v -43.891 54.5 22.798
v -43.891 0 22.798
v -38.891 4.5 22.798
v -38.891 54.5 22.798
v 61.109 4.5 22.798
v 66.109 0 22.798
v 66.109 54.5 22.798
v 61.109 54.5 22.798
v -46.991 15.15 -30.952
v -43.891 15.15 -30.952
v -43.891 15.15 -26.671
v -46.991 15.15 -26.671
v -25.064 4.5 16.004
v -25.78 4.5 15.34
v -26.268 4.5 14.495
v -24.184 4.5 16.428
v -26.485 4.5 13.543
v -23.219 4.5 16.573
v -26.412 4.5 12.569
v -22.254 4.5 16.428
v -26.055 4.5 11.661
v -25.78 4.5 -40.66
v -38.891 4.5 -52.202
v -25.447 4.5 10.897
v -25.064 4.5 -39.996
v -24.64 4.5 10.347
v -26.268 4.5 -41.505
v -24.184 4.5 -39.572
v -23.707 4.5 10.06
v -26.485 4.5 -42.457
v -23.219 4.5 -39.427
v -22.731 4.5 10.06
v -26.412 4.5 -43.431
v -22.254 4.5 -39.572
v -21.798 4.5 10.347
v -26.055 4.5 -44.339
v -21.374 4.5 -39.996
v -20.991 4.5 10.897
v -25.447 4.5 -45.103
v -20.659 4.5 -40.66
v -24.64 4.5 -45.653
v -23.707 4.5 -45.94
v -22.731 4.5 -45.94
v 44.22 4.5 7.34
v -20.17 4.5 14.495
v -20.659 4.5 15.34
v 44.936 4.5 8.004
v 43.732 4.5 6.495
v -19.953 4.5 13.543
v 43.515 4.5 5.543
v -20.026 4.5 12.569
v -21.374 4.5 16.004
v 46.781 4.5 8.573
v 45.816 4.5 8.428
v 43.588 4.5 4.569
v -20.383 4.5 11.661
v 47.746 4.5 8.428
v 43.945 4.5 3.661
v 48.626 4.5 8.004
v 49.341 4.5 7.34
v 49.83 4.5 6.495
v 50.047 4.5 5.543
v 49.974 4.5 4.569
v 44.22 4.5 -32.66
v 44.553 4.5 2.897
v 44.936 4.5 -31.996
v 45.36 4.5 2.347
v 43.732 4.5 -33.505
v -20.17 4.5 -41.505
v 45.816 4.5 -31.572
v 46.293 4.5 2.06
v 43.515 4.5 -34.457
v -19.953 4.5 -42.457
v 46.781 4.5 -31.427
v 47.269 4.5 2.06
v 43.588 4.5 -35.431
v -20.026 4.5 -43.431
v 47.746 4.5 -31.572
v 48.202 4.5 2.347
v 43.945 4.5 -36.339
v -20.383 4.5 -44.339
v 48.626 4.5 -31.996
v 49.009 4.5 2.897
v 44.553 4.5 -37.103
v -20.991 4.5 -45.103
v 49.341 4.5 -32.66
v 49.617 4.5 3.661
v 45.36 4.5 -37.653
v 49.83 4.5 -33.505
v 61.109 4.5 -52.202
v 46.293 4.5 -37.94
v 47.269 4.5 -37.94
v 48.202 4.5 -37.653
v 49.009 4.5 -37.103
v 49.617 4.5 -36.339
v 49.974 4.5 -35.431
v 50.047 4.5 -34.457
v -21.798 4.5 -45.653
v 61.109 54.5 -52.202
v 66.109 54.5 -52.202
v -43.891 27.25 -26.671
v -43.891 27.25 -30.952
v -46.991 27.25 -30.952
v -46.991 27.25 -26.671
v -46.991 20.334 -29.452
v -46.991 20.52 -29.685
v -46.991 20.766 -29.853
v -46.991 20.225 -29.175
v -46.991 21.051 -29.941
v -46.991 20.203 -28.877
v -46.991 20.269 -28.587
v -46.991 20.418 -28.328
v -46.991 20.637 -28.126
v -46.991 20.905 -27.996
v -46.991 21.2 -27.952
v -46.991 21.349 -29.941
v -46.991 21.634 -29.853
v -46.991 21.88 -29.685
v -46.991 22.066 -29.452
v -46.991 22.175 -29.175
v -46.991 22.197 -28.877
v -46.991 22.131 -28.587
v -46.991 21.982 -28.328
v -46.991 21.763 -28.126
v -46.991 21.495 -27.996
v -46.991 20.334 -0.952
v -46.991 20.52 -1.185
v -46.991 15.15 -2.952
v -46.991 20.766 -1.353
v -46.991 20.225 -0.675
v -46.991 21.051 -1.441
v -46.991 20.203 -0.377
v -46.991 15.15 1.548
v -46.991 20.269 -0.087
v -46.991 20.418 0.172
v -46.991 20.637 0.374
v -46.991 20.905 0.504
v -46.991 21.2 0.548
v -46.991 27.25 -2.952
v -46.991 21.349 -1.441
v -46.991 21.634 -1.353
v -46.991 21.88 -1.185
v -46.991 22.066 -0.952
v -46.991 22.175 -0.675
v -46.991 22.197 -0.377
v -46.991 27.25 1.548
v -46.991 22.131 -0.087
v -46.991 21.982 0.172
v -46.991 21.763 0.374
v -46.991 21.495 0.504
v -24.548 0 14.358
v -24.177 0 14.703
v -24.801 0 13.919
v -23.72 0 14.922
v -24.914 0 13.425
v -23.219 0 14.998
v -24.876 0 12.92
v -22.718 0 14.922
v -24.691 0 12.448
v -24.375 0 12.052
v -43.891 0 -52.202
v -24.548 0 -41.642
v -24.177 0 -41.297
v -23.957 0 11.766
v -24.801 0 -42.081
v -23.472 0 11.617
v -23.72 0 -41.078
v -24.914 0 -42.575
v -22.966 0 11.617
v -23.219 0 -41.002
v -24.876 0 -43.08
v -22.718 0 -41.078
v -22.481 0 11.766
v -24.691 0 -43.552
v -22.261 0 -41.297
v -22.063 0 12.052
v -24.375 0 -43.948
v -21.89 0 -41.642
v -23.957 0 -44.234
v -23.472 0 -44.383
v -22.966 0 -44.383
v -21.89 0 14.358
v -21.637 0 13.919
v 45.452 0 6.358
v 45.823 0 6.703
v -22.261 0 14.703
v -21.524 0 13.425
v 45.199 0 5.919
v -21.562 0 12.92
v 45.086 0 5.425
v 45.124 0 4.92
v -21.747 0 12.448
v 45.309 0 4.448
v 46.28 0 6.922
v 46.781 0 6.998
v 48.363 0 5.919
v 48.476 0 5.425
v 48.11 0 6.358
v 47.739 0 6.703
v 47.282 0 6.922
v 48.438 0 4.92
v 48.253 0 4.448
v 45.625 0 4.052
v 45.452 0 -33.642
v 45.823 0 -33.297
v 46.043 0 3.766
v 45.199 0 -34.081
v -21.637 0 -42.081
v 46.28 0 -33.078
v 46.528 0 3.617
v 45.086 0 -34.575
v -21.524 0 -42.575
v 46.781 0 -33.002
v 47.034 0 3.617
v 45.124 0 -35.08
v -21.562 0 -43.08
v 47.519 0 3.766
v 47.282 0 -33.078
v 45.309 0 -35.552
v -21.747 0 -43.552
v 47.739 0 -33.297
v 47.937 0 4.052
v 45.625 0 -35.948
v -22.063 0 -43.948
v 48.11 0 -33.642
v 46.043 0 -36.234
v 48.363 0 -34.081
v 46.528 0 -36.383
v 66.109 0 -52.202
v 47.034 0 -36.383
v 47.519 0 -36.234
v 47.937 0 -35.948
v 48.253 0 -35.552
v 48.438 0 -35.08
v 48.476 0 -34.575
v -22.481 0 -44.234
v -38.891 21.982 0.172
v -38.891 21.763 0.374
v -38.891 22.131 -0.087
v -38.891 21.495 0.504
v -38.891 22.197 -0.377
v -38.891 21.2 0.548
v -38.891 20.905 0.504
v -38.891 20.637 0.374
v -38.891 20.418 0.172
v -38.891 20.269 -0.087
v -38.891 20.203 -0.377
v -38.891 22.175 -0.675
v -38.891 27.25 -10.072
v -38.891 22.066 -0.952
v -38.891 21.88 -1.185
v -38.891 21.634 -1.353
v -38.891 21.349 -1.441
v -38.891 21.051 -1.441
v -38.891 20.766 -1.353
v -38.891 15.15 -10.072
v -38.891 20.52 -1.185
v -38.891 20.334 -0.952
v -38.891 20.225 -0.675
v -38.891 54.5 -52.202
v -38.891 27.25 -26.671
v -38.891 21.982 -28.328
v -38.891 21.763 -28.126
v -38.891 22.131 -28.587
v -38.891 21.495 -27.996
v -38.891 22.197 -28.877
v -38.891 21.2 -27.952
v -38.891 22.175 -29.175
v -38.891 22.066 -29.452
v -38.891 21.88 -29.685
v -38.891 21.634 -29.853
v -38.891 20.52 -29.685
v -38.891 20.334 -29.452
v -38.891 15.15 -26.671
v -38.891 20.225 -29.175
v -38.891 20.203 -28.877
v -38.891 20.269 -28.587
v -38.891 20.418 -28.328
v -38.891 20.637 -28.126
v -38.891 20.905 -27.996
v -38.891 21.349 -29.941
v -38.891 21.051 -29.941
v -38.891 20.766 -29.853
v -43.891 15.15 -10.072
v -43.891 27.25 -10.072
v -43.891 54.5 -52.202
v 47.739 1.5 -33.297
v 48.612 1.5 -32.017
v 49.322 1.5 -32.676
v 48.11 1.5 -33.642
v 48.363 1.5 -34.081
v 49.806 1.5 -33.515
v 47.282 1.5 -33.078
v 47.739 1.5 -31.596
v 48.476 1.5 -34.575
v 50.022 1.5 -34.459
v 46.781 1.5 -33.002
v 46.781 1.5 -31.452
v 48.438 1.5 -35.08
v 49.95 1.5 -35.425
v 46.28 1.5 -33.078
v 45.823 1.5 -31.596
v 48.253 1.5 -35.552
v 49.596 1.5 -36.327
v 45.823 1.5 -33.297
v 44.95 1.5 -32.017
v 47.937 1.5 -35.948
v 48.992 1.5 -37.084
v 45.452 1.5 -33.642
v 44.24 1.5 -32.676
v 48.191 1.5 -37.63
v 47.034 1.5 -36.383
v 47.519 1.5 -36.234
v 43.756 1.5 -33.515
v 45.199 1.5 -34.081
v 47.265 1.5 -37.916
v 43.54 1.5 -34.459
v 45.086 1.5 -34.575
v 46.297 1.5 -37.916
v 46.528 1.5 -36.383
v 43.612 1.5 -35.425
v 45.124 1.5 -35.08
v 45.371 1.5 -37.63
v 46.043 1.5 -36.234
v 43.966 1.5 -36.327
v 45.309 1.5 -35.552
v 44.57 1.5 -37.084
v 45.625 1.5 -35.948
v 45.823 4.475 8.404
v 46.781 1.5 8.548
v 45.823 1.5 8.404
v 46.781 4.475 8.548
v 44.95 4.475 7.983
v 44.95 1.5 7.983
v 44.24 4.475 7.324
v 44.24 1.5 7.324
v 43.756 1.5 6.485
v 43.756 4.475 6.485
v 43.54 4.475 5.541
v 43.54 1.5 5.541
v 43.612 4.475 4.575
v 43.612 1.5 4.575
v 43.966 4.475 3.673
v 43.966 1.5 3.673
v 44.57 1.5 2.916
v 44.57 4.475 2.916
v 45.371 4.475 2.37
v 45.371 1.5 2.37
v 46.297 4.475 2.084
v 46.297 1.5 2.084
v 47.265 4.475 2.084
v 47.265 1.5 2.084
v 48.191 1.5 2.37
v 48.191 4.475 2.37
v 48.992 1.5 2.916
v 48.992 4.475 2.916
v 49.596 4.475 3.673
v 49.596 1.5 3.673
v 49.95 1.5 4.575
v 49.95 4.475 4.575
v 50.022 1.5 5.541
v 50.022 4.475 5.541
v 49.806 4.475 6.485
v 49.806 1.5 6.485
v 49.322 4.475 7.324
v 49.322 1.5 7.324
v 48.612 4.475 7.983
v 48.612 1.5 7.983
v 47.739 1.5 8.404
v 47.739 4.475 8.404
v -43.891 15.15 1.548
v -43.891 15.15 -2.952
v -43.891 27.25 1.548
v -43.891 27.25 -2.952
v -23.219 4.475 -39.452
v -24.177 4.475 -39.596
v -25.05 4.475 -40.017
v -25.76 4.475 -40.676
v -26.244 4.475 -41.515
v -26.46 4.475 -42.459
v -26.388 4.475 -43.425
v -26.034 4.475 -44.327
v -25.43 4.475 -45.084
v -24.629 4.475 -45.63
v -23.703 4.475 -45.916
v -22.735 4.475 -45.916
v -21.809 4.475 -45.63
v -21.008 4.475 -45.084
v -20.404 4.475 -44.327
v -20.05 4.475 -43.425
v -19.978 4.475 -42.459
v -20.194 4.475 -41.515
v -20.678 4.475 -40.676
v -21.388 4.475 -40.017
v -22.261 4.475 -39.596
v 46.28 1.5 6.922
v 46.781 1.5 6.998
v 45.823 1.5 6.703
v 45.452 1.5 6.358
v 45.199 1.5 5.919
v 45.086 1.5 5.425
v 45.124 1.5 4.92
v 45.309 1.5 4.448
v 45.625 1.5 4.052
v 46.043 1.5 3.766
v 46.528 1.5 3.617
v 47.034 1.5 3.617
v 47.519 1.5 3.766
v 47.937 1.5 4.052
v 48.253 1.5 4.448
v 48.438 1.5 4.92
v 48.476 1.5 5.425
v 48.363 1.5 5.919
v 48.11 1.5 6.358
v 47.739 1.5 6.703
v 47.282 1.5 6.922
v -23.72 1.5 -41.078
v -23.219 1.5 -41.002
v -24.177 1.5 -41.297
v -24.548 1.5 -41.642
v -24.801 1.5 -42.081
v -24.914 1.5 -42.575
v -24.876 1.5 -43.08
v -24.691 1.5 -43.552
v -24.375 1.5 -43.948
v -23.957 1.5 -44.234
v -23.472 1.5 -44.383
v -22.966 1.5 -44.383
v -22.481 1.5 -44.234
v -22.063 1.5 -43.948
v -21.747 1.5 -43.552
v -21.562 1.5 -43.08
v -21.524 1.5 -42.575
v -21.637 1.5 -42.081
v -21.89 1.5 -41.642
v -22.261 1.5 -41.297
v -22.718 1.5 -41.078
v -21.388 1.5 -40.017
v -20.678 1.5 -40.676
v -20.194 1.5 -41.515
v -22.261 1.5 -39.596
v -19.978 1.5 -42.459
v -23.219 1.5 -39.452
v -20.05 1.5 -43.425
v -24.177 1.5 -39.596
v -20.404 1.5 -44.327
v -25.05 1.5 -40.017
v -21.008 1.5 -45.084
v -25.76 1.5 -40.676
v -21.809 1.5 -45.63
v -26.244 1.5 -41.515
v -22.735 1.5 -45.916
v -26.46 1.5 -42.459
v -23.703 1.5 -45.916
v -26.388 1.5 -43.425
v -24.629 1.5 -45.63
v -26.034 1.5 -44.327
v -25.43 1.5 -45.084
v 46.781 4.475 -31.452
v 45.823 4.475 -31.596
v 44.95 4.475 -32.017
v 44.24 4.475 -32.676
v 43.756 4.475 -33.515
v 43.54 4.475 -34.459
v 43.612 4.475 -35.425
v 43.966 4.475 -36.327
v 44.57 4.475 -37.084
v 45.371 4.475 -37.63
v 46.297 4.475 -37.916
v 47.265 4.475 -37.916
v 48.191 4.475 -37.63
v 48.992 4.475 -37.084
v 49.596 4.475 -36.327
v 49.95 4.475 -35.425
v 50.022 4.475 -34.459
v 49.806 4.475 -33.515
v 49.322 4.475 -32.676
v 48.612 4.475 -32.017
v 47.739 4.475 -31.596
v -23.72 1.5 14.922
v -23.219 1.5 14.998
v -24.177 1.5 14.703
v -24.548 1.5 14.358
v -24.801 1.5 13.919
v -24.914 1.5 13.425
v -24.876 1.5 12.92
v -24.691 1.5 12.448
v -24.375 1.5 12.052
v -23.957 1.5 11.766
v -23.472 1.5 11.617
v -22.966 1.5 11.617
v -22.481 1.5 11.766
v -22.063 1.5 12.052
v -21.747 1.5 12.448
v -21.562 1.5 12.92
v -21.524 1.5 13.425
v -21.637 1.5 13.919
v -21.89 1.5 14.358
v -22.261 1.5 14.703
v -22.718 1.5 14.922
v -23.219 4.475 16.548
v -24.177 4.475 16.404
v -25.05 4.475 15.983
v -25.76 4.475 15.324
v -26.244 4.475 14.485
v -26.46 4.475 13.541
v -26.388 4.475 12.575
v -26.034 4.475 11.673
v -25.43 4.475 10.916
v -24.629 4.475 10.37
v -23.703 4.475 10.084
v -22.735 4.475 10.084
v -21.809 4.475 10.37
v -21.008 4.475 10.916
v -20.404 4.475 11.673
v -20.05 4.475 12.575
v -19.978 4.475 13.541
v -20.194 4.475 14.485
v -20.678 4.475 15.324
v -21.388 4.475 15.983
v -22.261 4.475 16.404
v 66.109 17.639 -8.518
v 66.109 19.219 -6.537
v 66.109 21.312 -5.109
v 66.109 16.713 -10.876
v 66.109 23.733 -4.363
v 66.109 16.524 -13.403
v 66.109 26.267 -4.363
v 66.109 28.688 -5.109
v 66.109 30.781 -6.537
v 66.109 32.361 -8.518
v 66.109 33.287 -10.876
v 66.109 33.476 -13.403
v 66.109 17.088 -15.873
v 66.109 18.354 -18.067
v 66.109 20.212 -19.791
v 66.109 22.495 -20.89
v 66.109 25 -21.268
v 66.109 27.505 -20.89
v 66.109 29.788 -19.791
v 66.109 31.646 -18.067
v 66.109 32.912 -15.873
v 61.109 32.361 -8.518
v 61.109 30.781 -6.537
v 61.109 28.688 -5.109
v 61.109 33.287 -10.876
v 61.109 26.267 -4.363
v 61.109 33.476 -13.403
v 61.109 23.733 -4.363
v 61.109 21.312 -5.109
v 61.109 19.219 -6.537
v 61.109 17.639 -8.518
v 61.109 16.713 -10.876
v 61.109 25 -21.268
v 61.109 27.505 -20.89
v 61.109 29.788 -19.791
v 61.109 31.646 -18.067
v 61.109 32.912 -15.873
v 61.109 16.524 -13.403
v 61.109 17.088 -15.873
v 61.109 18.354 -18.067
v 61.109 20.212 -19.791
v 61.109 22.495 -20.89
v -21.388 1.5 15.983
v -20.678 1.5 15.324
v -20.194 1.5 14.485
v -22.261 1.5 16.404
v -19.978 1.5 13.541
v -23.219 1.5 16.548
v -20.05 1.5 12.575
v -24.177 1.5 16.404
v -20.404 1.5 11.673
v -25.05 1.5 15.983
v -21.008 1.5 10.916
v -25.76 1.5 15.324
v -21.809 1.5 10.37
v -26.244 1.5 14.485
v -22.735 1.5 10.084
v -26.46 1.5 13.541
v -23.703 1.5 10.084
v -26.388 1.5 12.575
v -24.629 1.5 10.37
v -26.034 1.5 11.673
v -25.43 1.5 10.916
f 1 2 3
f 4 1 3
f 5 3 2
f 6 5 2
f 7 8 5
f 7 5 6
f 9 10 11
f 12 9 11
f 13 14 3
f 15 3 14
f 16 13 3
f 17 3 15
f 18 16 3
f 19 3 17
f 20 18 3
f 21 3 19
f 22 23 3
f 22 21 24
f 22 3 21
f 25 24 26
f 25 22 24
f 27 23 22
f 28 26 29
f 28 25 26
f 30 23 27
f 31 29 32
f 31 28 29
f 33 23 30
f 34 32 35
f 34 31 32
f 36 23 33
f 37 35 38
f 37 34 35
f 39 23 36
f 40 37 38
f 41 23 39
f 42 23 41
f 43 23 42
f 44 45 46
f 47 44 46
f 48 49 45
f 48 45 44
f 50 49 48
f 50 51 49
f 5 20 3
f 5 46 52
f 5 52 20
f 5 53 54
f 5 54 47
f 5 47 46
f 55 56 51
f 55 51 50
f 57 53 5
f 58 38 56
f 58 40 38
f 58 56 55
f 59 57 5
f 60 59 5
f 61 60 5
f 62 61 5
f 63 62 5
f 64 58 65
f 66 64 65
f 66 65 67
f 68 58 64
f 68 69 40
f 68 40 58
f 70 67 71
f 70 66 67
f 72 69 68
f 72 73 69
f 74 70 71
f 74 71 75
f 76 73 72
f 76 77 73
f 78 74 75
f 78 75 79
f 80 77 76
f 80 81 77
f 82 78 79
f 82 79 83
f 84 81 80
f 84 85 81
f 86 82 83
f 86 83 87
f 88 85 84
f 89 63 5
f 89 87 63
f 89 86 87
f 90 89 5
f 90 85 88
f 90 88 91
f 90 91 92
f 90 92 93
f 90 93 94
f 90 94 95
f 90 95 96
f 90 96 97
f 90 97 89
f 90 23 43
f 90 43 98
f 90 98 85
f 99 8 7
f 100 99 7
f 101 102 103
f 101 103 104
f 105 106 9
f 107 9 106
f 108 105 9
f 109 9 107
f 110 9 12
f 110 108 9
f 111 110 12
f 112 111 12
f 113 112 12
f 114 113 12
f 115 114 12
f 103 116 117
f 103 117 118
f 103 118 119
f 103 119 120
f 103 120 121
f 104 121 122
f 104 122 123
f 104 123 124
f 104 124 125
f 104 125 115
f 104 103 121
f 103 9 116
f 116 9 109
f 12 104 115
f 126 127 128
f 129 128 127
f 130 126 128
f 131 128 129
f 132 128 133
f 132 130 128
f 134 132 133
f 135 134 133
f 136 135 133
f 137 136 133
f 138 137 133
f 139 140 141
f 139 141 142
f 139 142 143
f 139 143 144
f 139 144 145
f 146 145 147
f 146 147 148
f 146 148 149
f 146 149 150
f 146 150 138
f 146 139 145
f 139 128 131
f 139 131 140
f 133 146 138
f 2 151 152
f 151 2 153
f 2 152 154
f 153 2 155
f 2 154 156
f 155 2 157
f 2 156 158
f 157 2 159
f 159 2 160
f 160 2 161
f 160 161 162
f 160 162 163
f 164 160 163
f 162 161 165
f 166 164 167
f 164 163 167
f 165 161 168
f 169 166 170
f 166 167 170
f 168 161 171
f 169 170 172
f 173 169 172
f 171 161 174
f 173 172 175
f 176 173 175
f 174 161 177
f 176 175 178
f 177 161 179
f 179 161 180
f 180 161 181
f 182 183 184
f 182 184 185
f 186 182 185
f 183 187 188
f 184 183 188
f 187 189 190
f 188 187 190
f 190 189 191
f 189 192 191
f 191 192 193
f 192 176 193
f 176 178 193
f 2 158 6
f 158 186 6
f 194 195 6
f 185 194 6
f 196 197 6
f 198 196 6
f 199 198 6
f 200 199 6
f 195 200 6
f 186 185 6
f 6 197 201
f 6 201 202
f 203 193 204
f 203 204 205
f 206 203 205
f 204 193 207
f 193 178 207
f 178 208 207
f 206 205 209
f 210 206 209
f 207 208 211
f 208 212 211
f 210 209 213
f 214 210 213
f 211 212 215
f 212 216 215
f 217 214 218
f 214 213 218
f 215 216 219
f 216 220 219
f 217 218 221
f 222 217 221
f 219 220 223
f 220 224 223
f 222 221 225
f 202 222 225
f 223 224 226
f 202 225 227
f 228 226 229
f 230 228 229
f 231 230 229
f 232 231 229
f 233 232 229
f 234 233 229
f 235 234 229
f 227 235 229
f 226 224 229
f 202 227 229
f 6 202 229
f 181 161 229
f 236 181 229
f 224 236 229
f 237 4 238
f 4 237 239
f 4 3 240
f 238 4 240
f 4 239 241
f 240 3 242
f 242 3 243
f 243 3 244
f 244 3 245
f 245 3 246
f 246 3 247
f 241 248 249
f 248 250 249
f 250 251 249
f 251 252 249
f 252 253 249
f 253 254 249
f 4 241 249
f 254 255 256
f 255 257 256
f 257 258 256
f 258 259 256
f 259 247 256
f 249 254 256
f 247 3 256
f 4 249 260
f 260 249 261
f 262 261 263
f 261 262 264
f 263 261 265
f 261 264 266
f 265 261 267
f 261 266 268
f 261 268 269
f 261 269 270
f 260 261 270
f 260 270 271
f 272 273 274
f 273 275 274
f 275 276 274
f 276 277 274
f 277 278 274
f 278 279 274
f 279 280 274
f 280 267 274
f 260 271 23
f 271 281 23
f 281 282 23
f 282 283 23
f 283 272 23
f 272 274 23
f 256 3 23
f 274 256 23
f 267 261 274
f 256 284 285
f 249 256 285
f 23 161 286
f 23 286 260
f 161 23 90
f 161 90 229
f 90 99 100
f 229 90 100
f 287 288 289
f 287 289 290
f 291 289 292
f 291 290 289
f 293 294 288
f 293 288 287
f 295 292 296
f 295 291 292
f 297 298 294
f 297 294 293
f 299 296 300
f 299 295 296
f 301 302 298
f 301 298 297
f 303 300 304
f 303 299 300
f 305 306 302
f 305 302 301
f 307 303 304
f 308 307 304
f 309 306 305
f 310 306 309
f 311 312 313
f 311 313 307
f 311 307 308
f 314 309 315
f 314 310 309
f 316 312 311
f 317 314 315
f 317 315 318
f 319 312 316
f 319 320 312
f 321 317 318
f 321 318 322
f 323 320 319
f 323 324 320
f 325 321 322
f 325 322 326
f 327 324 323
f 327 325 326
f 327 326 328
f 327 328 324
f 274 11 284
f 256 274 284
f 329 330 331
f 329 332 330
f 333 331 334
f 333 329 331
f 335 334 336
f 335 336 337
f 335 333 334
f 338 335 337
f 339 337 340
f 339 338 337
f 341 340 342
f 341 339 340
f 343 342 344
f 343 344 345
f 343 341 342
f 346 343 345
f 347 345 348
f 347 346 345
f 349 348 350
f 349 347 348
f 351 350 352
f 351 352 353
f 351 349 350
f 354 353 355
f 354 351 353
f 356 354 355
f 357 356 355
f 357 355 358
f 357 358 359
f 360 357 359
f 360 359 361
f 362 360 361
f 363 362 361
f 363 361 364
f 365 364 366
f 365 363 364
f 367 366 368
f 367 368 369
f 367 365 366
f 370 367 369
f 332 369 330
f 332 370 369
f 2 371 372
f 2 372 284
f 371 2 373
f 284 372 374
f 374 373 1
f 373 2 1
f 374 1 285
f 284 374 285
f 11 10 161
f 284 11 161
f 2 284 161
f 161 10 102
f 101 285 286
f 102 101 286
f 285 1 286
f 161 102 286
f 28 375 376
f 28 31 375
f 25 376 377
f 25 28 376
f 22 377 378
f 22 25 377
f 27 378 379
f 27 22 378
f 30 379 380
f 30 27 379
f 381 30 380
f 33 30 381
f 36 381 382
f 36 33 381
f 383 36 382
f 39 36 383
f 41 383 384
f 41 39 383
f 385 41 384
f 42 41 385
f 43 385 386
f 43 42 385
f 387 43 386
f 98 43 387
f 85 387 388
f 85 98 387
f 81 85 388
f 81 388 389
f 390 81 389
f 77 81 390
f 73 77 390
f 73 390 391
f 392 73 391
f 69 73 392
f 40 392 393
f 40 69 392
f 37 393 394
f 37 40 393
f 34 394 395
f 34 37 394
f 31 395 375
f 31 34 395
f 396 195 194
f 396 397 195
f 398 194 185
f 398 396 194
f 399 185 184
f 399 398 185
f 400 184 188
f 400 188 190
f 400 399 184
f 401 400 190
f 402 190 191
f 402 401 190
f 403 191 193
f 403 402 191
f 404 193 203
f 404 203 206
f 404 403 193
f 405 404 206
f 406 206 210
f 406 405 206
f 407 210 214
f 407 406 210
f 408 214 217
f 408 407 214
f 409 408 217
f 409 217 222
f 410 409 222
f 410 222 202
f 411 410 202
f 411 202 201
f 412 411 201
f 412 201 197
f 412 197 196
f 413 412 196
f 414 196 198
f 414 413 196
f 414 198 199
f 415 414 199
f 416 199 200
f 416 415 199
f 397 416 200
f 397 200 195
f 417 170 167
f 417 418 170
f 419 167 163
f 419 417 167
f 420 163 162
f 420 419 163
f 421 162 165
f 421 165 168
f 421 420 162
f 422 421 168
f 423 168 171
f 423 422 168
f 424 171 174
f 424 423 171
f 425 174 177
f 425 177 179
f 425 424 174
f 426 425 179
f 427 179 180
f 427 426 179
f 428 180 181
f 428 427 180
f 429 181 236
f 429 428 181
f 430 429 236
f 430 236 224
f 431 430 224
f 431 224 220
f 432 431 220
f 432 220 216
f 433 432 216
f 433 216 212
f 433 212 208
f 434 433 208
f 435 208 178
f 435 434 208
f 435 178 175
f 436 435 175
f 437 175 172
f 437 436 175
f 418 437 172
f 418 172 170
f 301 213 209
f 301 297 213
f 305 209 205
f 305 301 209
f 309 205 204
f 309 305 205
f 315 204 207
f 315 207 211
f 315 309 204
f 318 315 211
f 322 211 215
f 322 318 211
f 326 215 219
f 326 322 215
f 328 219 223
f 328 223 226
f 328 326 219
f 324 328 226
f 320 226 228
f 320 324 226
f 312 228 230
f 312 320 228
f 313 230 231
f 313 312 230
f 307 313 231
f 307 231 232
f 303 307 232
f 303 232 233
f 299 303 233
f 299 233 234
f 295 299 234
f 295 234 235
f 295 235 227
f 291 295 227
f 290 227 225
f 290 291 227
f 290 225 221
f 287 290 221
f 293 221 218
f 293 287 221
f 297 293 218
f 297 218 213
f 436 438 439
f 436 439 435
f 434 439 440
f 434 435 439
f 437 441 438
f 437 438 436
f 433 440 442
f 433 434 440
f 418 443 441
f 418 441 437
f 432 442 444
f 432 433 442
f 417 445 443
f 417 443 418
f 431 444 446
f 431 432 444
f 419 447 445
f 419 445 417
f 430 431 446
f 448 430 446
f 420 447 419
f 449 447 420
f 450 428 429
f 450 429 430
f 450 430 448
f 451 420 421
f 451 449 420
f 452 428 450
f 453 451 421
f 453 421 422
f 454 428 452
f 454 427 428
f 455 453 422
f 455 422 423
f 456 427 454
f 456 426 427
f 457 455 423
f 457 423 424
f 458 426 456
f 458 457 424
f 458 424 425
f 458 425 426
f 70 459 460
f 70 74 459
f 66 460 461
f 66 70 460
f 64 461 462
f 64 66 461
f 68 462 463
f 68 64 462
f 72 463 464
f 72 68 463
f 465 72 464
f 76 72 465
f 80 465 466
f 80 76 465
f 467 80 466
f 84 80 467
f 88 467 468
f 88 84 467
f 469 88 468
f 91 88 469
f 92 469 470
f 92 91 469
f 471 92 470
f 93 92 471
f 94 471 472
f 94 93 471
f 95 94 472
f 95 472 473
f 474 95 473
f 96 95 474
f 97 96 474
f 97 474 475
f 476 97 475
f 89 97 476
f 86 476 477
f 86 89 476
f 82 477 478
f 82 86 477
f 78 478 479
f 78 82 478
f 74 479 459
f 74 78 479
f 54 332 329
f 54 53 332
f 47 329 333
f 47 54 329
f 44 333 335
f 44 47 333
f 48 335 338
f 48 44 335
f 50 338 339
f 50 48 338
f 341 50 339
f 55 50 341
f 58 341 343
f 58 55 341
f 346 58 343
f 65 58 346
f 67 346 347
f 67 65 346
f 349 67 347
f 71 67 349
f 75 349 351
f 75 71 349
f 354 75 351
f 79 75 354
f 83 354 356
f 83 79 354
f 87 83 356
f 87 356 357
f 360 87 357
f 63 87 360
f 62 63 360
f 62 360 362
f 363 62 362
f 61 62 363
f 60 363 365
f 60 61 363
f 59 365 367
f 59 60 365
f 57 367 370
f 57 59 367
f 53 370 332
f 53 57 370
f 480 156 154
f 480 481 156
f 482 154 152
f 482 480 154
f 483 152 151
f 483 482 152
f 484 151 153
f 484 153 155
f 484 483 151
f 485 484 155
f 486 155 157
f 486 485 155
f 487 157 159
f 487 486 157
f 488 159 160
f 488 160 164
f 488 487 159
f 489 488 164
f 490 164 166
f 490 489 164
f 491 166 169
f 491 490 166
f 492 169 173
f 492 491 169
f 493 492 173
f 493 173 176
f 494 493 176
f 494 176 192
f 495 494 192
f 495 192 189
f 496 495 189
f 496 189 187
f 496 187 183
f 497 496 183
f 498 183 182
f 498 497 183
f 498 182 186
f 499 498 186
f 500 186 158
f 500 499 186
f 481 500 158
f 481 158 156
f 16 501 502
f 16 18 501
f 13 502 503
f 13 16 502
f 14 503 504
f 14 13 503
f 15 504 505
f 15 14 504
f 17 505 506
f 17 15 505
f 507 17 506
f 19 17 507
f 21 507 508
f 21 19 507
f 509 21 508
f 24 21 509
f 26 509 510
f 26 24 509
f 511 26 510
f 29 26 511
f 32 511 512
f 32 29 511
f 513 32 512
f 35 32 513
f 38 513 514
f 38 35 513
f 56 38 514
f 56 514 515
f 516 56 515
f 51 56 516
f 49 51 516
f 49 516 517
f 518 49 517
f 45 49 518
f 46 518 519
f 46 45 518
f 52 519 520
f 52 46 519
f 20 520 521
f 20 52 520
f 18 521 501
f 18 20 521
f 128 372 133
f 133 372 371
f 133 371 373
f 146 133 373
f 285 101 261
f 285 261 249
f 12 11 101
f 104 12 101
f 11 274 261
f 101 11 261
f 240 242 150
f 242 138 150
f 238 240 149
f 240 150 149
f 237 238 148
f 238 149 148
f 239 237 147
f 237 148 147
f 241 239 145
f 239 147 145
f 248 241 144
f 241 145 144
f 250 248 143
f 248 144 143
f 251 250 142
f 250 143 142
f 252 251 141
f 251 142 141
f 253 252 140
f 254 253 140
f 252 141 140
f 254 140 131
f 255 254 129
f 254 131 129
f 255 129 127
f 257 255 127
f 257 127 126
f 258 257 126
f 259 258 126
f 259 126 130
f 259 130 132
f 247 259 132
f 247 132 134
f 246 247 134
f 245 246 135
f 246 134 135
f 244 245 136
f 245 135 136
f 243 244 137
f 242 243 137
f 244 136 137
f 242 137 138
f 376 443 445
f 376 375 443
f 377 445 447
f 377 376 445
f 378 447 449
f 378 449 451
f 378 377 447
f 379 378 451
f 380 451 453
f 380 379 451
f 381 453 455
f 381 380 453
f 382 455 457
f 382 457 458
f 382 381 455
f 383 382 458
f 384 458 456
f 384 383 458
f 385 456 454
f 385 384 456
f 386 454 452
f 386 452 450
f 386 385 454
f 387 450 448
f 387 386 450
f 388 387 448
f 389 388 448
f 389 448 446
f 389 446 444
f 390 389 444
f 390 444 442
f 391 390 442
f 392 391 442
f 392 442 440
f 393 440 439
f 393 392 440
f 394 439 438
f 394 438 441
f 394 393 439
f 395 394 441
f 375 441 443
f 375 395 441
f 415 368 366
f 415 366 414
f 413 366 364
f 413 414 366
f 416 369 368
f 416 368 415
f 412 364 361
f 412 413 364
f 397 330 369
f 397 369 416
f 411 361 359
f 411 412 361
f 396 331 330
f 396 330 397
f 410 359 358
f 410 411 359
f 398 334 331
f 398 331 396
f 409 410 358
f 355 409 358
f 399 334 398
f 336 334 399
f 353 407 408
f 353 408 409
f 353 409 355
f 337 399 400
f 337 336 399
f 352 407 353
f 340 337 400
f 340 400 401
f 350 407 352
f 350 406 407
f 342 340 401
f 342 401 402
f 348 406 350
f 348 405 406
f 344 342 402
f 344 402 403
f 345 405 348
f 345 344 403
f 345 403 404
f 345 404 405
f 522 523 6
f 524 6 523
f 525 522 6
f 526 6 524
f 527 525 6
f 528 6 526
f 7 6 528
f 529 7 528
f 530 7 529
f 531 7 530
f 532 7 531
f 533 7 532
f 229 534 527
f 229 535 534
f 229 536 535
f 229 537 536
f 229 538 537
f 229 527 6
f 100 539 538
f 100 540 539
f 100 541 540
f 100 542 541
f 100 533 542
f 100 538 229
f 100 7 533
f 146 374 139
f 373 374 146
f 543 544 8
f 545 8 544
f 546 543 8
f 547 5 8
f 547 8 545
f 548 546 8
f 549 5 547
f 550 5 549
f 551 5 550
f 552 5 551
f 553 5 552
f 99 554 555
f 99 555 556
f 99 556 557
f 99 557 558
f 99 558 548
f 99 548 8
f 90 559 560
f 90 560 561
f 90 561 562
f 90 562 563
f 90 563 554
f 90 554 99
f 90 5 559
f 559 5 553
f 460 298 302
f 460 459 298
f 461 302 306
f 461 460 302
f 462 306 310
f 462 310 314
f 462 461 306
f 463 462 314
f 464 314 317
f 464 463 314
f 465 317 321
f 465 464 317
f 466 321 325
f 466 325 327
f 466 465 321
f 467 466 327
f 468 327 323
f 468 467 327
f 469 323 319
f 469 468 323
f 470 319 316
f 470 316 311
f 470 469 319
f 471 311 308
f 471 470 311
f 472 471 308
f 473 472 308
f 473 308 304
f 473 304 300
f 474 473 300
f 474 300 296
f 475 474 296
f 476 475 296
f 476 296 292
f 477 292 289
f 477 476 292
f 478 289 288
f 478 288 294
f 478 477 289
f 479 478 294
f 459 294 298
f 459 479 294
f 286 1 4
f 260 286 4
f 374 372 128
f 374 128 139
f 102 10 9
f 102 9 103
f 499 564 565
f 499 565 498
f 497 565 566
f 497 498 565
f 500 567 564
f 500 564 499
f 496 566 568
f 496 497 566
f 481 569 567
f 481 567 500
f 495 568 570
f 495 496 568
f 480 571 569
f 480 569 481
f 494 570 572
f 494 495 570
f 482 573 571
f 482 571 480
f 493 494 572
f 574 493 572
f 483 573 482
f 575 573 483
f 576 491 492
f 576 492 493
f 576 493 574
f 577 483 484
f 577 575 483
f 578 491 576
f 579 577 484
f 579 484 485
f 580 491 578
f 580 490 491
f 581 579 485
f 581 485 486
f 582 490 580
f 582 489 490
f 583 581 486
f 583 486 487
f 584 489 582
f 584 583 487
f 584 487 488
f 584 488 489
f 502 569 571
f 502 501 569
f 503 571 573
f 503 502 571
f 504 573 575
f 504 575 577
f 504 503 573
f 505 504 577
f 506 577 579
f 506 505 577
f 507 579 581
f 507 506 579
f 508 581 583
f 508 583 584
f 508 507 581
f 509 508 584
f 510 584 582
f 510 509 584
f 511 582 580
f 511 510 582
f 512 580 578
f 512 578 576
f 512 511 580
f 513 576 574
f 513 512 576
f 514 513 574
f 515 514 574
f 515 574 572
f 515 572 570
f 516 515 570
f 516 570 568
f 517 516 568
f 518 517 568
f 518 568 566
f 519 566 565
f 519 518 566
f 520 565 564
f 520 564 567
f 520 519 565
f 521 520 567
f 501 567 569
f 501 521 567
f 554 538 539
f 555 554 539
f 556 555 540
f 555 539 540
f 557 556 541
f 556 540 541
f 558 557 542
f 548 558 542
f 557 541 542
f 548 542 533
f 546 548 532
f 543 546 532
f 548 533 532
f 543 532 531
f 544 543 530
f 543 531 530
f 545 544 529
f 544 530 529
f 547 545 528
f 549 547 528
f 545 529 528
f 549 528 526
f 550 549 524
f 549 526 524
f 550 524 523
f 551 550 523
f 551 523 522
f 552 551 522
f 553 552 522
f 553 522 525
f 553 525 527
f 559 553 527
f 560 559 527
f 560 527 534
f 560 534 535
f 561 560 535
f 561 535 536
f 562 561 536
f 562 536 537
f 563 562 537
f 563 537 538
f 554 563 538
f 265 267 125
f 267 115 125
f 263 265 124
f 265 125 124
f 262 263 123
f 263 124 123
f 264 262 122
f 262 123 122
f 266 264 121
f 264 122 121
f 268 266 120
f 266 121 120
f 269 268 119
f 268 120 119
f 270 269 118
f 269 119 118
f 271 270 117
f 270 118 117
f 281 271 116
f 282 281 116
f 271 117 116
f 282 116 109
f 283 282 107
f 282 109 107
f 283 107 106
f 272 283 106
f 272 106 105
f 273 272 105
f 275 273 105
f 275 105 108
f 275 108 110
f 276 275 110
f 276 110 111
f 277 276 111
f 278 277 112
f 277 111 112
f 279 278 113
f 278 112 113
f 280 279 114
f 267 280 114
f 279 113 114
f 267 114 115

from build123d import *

# Parameters (mm, degrees)
SKETCH1_W                                      = 100
SKETCH1_H                                      = 75
BOSS_EXTRUDE1_DEPTH                            = 4.5
CBORE_FOR_M3_SOCKET_HEAD_CAP_SCREW1_AT_2_COUNT = 2
CBORE_FOR_M3_SOCKET_HEAD_CAP_SCREW1_AT_2_PITCH = 56
CBORE_FOR_M3_SOCKET_HEAD_CAP_SCREW1_AT_3_COUNT = 2
CBORE_FOR_M3_SOCKET_HEAD_CAP_SCREW1_AT_3_PITCH = 84.876380696
CBORE_FOR_M3_SOCKET_HEAD_CAP_SCREW1_AT_4_COUNT = 2
CBORE_FOR_M3_SOCKET_HEAD_CAP_SCREW1_AT_4_PITCH = 70.455659815
SKETCH5_W                                      = 5
SKETCH5_H                                      = 75
BOSS_EXTRUDE2_DEPTH                            = 50
BOSS_EXTRUDE2_DEPTH_BACK                       = 4.5
SKETCH7_W                                      = 4.5
SKETCH7_H                                      = 12.1
BOSS_EXTRUDE3_DEPTH                            = 3.1
SKETCH6_R                                      = 1
SKETCH6_W                                      = 16.599006094
SKETCH6_H                                      = 12.1
CUT_EXTRUDE1_DEPTH                             = 10
CUT_EXTRUDE1_DEPTH_BACK                        = 9.1
SKETCH8_R                                      = 8.5
CUT_EXTRUDE2_DEPTH                             = 9.1


with BuildPart() as part:
    # Sketch1 → Boss-Extrude1 (new body)
    with BuildSketch(Plane(origin=(0, 0, 0), x_dir=(1, 0, 0), z_dir=(0, 1, 0))):
        with Locations((11.109271523, 14.701986755)):
            Rectangle(SKETCH1_W, SKETCH1_H)
    extrude(amount=BOSS_EXTRUDE1_DEPTH)

    # Sketch4 → CBORE for M3 Socket Head Cap Screw1 (revolve, cut)
    with BuildSketch(Plane(origin=(-23.219008058, 4.5, -42.701986755), x_dir=(0, 0, 1), z_dir=(1, 0, 0))):
        Polygon((0, 0), (0, 4.5), (1.7, 4.5), (1.7, 3), (3.25, 3), (3.25, 0.025), (3.275, 0), align=None)
    cbore_for_m3_socket_head_cap_screw1 = revolve(axis=Axis((-23.219008058, 10.85, -42.701986755), (0, -1, 0)), mode=Mode.SUBTRACT)

    # CBORE for M3 Socket Head Cap Screw1 at 2: CBORE for M3 Socket Head Cap Screw1 ×2
    with Locations(*[(0, 0, i * CBORE_FOR_M3_SOCKET_HEAD_CAP_SCREW1_AT_2_PITCH) for i in range(1, CBORE_FOR_M3_SOCKET_HEAD_CAP_SCREW1_AT_2_COUNT)]):
        add(cbore_for_m3_socket_head_cap_screw1, mode=Mode.SUBTRACT)

    # CBORE for M3 Socket Head Cap Screw1 at 3: CBORE for M3 Socket Head Cap Screw1 ×2
    with Locations(*[Vector(0.824728852, 0, 0.565528356) * (i * CBORE_FOR_M3_SOCKET_HEAD_CAP_SCREW1_AT_3_PITCH) for i in range(1, CBORE_FOR_M3_SOCKET_HEAD_CAP_SCREW1_AT_3_COUNT)]):
        add(cbore_for_m3_socket_head_cap_screw1, mode=Mode.SUBTRACT)

    # CBORE for M3 Socket Head Cap Screw1 at 4: CBORE for M3 Socket Head Cap Screw1 ×2
    with Locations(*[Vector(0.993532673, 0, 0.113546591) * (i * CBORE_FOR_M3_SOCKET_HEAD_CAP_SCREW1_AT_4_PITCH) for i in range(1, CBORE_FOR_M3_SOCKET_HEAD_CAP_SCREW1_AT_4_COUNT)]):
        add(cbore_for_m3_socket_head_cap_screw1, mode=Mode.SUBTRACT)

    # Sketch5 → Boss-Extrude2 (add, two sides)
    with BuildSketch(Plane(origin=(0, 4.5, 0), x_dir=(1, 0, 0), z_dir=(0, 1, 0))) as boss_extrude2_sk:
        with Locations((-41.390728477, 14.701986755)):
            Rectangle(SKETCH5_W, SKETCH5_H)
        with Locations((63.609271523, 14.701986755)):
            Rectangle(SKETCH5_W, SKETCH5_H)
    extrude(amount=BOSS_EXTRUDE2_DEPTH)
    extrude(boss_extrude2_sk.sketch, amount=-BOSS_EXTRUDE2_DEPTH_BACK)

    # Sketch7 → Boss-Extrude3 (add)
    with BuildSketch(Plane.ZY.offset(43.890728477)):
        with Locations((-28.701986755, 21.2)):
            Rectangle(SKETCH7_W, SKETCH7_H)
        with Locations((-0.701986755, 21.2)):
            Rectangle(SKETCH7_W, SKETCH7_H)
    extrude(amount=BOSS_EXTRUDE3_DEPTH)

    # Sketch6 → Cut-Extrude1 (cut, two sides)
    with BuildSketch(Plane.ZY.offset(43.890728477)) as cut_extrude1_sk:
        with Locations((-28.951986755, 21.2)):
            Circle(SKETCH6_R)
        with Locations((-0.451986755, 21.2)):
            Circle(SKETCH6_R)
        with Locations((-18.371105673, 21.2)):
            Rectangle(SKETCH6_W, SKETCH6_H)
    extrude(amount=CUT_EXTRUDE1_DEPTH, mode=Mode.SUBTRACT)
    extrude(cut_extrude1_sk.sketch, amount=-CUT_EXTRUDE1_DEPTH_BACK, mode=Mode.SUBTRACT)

    # Sketch8 → Cut-Extrude2 (cut)
    with BuildSketch(Plane(origin=(66.109271523, 0, 0), x_dir=(0, 0, -1), z_dir=(1, 0, 0))):
        with Locations((12.767684718, 25)):
            Circle(SKETCH8_R)
    extrude(amount=-CUT_EXTRUDE2_DEPTH, mode=Mode.SUBTRACT)


solid = part.part
